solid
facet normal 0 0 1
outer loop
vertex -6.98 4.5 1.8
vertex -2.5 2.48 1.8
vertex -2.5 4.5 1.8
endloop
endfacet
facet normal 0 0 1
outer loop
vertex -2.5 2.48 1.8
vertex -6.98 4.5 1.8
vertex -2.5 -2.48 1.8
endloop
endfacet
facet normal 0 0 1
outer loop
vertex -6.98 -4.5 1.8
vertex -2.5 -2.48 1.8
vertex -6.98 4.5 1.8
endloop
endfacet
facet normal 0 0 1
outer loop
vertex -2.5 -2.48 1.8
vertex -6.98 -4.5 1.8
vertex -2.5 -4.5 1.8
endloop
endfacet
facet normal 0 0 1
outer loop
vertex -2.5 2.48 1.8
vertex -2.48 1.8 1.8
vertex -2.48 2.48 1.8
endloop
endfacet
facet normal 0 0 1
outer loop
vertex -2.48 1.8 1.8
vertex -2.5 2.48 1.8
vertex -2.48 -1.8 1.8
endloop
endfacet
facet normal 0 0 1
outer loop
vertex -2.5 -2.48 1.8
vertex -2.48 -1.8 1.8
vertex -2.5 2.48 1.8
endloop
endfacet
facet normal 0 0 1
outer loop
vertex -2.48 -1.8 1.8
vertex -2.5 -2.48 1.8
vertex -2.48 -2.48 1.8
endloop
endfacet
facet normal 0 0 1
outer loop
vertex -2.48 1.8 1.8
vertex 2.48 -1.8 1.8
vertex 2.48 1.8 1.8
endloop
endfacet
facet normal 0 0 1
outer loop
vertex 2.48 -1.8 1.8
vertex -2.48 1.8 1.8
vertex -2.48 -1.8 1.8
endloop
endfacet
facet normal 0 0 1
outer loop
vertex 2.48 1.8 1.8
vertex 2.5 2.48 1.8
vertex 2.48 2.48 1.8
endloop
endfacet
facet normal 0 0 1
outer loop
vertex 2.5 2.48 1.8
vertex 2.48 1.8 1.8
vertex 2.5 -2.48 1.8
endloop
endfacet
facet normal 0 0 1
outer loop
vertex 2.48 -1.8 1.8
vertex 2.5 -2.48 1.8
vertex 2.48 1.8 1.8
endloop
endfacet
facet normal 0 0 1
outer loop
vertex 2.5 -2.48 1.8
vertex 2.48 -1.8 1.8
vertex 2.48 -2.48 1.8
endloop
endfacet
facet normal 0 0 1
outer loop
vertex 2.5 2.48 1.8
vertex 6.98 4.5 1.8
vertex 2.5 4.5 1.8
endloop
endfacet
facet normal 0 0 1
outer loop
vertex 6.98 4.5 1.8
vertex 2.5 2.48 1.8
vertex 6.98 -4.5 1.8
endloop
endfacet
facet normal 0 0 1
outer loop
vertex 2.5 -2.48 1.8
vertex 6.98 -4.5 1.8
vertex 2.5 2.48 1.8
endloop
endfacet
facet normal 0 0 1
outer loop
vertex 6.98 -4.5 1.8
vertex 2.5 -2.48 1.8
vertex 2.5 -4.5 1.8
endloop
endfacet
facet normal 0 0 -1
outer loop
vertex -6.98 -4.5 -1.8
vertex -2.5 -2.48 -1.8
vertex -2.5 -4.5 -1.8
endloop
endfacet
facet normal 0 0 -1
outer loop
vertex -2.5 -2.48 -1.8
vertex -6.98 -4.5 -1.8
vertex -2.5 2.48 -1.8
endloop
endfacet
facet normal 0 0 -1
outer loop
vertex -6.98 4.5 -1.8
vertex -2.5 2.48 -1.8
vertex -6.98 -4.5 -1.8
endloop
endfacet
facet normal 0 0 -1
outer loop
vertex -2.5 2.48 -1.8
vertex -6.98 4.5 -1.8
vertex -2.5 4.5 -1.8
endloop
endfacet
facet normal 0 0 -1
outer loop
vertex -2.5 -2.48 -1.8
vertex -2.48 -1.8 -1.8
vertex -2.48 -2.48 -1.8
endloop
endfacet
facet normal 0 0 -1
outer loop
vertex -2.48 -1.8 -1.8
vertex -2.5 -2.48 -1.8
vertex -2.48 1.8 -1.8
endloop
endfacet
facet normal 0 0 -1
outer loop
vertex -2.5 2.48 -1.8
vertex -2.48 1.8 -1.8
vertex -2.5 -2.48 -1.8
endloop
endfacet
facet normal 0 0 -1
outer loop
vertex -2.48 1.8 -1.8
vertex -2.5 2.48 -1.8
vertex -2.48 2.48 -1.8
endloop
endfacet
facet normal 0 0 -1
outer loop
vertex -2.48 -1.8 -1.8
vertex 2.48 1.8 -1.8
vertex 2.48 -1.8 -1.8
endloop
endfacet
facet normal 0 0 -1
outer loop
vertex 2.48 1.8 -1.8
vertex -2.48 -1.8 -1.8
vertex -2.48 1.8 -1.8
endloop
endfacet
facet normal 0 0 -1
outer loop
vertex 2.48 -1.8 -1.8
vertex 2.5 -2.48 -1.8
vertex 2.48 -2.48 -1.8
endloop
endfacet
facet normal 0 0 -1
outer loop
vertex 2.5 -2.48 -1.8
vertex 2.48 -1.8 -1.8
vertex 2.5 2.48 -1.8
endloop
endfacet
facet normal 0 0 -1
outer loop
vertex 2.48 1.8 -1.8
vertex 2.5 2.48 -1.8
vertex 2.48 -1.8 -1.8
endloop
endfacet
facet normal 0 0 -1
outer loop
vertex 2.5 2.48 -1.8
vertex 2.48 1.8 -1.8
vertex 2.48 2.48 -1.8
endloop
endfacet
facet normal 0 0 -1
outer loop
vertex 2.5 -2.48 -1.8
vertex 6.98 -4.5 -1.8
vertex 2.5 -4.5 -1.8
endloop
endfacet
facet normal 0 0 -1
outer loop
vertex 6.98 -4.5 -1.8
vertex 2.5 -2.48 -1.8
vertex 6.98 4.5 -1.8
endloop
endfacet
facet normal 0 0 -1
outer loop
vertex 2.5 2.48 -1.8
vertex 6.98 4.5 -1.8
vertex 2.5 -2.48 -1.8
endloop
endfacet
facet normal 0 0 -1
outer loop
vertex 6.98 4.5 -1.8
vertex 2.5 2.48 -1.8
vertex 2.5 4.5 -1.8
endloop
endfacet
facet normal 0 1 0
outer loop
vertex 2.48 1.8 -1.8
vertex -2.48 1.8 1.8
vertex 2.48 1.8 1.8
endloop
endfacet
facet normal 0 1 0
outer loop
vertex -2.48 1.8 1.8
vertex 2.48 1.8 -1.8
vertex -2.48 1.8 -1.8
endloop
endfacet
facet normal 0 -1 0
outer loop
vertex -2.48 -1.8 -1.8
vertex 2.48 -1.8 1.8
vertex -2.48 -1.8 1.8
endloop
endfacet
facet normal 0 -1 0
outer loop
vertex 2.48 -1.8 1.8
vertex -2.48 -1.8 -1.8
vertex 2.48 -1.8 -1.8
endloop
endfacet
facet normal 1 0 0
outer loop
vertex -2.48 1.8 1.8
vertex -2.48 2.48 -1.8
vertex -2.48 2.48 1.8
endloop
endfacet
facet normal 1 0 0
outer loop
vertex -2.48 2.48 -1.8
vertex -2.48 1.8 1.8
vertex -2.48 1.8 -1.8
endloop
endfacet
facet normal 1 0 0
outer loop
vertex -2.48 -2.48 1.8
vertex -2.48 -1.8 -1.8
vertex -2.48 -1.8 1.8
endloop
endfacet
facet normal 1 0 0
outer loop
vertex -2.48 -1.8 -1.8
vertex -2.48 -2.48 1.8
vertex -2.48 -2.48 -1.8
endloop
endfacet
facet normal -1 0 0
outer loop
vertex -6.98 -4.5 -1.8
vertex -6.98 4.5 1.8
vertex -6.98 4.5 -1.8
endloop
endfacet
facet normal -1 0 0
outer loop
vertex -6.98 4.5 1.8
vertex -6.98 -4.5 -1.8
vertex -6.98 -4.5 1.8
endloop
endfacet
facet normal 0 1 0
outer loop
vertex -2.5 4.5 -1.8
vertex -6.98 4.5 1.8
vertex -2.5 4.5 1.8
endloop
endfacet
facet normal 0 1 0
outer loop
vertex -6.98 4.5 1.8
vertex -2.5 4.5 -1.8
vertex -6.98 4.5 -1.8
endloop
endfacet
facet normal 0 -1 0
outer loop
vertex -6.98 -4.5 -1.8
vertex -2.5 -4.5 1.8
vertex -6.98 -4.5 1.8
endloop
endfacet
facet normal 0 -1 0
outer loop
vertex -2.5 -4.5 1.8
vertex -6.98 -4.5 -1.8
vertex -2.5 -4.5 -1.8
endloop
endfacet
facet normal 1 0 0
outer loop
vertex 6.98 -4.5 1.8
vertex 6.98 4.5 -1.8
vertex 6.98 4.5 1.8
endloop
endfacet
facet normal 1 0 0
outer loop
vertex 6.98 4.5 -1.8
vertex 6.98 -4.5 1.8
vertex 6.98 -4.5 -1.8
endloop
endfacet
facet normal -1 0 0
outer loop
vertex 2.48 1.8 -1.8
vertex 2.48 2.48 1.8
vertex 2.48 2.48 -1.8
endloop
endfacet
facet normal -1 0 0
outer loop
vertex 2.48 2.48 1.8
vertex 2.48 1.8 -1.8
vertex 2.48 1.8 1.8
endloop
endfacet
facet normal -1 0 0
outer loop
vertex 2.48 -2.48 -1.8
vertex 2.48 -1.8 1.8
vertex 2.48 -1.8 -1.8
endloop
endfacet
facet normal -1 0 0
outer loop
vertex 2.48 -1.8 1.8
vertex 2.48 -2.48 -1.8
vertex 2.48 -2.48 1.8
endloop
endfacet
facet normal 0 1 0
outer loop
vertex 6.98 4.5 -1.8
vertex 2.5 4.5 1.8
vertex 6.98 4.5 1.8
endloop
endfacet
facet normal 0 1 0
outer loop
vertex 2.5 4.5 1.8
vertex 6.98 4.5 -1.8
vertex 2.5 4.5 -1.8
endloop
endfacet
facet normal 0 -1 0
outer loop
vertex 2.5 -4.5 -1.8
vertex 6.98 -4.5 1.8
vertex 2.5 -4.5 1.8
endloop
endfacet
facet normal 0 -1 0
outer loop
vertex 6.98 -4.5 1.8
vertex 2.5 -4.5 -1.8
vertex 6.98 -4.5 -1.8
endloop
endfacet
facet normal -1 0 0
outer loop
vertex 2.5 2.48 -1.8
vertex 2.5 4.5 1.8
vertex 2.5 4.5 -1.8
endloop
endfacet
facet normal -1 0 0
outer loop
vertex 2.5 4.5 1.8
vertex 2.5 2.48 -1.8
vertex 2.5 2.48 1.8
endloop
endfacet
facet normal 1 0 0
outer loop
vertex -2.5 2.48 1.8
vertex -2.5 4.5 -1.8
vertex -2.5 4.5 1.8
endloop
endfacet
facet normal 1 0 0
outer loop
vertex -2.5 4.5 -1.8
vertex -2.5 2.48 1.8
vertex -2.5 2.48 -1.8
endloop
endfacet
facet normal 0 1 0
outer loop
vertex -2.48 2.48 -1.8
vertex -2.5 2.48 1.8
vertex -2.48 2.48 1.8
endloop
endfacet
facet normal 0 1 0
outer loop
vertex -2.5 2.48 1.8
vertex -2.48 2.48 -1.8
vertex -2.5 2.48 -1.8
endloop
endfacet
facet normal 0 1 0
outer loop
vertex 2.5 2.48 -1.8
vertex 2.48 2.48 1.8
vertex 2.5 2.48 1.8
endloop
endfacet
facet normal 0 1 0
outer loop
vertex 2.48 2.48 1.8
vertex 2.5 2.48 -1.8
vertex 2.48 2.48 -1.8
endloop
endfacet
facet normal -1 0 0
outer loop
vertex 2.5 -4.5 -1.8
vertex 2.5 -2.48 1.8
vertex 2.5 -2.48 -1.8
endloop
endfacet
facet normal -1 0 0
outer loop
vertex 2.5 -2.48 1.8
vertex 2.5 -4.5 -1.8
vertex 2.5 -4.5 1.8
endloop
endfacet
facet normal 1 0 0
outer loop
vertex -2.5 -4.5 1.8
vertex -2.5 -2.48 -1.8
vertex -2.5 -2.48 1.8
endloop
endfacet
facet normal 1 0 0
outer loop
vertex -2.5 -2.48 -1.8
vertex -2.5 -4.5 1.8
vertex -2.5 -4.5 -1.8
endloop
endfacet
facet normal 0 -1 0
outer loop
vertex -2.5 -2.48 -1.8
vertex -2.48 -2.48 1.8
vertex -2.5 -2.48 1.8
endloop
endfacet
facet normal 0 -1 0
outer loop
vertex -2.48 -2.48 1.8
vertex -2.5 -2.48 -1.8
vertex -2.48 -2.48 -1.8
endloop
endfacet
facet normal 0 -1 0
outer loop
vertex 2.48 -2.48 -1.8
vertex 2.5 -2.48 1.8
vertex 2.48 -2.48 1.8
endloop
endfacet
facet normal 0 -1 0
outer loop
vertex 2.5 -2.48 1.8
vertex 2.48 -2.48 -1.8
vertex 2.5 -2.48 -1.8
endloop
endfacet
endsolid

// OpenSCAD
// Symmetric prismatic connector/block
// Bounding box: 14.0 x 9.0 x 3.6 mm  (X x Y x Z)

L = 14.0;
W = 9.0;
T = 3.6;

// End masses and central web (H-profile in front/back)
end_L = 4.5;                 // length of each end mass along X
web_L = L - 2*end_L;          // central span along X
web_W = 3.6;                  // web width along Y

// Midspan relief notches on top and bottom edges (in Y), through full thickness (Z)
notch_L = 5.0;                // notch length along X
notch_W = 2.0;                // notch depth from edge along Y

eps = 0.02;                   // small overlap to avoid coplanar artifacts

module main_prismatic_body() {
    union() {
        // Central web
        cube([web_L, web_W, T], center=true);

        // End masses (connected to web with slight overlap)
        translate([-(web_L/2 + end_L/2 - eps), 0, 0])
            cube([end_L, W, T], center=true);

        translate([(web_L/2 + end_L/2 - eps), 0, 0])
            cube([end_L, W, T], center=true);
    }
}

module relief_notches() {
    // Cut rectangular notches from the top and bottom edges in Y,
    // through the full thickness in Z to match the H-profile views.
    union() {
        // Top edge notch (+Y)
        translate([0, (W/2 - notch_W/2), 0])
            cube([notch_L, notch_W + 2*eps, T + 2*eps], center=true);

        // Bottom edge notch (-Y)
        translate([0, -(W/2 - notch_W/2), 0])
            cube([notch_L, notch_W + 2*eps, T + 2*eps], center=true);
    }
}

difference() {
    main_prismatic_body();
    relief_notches();
}
